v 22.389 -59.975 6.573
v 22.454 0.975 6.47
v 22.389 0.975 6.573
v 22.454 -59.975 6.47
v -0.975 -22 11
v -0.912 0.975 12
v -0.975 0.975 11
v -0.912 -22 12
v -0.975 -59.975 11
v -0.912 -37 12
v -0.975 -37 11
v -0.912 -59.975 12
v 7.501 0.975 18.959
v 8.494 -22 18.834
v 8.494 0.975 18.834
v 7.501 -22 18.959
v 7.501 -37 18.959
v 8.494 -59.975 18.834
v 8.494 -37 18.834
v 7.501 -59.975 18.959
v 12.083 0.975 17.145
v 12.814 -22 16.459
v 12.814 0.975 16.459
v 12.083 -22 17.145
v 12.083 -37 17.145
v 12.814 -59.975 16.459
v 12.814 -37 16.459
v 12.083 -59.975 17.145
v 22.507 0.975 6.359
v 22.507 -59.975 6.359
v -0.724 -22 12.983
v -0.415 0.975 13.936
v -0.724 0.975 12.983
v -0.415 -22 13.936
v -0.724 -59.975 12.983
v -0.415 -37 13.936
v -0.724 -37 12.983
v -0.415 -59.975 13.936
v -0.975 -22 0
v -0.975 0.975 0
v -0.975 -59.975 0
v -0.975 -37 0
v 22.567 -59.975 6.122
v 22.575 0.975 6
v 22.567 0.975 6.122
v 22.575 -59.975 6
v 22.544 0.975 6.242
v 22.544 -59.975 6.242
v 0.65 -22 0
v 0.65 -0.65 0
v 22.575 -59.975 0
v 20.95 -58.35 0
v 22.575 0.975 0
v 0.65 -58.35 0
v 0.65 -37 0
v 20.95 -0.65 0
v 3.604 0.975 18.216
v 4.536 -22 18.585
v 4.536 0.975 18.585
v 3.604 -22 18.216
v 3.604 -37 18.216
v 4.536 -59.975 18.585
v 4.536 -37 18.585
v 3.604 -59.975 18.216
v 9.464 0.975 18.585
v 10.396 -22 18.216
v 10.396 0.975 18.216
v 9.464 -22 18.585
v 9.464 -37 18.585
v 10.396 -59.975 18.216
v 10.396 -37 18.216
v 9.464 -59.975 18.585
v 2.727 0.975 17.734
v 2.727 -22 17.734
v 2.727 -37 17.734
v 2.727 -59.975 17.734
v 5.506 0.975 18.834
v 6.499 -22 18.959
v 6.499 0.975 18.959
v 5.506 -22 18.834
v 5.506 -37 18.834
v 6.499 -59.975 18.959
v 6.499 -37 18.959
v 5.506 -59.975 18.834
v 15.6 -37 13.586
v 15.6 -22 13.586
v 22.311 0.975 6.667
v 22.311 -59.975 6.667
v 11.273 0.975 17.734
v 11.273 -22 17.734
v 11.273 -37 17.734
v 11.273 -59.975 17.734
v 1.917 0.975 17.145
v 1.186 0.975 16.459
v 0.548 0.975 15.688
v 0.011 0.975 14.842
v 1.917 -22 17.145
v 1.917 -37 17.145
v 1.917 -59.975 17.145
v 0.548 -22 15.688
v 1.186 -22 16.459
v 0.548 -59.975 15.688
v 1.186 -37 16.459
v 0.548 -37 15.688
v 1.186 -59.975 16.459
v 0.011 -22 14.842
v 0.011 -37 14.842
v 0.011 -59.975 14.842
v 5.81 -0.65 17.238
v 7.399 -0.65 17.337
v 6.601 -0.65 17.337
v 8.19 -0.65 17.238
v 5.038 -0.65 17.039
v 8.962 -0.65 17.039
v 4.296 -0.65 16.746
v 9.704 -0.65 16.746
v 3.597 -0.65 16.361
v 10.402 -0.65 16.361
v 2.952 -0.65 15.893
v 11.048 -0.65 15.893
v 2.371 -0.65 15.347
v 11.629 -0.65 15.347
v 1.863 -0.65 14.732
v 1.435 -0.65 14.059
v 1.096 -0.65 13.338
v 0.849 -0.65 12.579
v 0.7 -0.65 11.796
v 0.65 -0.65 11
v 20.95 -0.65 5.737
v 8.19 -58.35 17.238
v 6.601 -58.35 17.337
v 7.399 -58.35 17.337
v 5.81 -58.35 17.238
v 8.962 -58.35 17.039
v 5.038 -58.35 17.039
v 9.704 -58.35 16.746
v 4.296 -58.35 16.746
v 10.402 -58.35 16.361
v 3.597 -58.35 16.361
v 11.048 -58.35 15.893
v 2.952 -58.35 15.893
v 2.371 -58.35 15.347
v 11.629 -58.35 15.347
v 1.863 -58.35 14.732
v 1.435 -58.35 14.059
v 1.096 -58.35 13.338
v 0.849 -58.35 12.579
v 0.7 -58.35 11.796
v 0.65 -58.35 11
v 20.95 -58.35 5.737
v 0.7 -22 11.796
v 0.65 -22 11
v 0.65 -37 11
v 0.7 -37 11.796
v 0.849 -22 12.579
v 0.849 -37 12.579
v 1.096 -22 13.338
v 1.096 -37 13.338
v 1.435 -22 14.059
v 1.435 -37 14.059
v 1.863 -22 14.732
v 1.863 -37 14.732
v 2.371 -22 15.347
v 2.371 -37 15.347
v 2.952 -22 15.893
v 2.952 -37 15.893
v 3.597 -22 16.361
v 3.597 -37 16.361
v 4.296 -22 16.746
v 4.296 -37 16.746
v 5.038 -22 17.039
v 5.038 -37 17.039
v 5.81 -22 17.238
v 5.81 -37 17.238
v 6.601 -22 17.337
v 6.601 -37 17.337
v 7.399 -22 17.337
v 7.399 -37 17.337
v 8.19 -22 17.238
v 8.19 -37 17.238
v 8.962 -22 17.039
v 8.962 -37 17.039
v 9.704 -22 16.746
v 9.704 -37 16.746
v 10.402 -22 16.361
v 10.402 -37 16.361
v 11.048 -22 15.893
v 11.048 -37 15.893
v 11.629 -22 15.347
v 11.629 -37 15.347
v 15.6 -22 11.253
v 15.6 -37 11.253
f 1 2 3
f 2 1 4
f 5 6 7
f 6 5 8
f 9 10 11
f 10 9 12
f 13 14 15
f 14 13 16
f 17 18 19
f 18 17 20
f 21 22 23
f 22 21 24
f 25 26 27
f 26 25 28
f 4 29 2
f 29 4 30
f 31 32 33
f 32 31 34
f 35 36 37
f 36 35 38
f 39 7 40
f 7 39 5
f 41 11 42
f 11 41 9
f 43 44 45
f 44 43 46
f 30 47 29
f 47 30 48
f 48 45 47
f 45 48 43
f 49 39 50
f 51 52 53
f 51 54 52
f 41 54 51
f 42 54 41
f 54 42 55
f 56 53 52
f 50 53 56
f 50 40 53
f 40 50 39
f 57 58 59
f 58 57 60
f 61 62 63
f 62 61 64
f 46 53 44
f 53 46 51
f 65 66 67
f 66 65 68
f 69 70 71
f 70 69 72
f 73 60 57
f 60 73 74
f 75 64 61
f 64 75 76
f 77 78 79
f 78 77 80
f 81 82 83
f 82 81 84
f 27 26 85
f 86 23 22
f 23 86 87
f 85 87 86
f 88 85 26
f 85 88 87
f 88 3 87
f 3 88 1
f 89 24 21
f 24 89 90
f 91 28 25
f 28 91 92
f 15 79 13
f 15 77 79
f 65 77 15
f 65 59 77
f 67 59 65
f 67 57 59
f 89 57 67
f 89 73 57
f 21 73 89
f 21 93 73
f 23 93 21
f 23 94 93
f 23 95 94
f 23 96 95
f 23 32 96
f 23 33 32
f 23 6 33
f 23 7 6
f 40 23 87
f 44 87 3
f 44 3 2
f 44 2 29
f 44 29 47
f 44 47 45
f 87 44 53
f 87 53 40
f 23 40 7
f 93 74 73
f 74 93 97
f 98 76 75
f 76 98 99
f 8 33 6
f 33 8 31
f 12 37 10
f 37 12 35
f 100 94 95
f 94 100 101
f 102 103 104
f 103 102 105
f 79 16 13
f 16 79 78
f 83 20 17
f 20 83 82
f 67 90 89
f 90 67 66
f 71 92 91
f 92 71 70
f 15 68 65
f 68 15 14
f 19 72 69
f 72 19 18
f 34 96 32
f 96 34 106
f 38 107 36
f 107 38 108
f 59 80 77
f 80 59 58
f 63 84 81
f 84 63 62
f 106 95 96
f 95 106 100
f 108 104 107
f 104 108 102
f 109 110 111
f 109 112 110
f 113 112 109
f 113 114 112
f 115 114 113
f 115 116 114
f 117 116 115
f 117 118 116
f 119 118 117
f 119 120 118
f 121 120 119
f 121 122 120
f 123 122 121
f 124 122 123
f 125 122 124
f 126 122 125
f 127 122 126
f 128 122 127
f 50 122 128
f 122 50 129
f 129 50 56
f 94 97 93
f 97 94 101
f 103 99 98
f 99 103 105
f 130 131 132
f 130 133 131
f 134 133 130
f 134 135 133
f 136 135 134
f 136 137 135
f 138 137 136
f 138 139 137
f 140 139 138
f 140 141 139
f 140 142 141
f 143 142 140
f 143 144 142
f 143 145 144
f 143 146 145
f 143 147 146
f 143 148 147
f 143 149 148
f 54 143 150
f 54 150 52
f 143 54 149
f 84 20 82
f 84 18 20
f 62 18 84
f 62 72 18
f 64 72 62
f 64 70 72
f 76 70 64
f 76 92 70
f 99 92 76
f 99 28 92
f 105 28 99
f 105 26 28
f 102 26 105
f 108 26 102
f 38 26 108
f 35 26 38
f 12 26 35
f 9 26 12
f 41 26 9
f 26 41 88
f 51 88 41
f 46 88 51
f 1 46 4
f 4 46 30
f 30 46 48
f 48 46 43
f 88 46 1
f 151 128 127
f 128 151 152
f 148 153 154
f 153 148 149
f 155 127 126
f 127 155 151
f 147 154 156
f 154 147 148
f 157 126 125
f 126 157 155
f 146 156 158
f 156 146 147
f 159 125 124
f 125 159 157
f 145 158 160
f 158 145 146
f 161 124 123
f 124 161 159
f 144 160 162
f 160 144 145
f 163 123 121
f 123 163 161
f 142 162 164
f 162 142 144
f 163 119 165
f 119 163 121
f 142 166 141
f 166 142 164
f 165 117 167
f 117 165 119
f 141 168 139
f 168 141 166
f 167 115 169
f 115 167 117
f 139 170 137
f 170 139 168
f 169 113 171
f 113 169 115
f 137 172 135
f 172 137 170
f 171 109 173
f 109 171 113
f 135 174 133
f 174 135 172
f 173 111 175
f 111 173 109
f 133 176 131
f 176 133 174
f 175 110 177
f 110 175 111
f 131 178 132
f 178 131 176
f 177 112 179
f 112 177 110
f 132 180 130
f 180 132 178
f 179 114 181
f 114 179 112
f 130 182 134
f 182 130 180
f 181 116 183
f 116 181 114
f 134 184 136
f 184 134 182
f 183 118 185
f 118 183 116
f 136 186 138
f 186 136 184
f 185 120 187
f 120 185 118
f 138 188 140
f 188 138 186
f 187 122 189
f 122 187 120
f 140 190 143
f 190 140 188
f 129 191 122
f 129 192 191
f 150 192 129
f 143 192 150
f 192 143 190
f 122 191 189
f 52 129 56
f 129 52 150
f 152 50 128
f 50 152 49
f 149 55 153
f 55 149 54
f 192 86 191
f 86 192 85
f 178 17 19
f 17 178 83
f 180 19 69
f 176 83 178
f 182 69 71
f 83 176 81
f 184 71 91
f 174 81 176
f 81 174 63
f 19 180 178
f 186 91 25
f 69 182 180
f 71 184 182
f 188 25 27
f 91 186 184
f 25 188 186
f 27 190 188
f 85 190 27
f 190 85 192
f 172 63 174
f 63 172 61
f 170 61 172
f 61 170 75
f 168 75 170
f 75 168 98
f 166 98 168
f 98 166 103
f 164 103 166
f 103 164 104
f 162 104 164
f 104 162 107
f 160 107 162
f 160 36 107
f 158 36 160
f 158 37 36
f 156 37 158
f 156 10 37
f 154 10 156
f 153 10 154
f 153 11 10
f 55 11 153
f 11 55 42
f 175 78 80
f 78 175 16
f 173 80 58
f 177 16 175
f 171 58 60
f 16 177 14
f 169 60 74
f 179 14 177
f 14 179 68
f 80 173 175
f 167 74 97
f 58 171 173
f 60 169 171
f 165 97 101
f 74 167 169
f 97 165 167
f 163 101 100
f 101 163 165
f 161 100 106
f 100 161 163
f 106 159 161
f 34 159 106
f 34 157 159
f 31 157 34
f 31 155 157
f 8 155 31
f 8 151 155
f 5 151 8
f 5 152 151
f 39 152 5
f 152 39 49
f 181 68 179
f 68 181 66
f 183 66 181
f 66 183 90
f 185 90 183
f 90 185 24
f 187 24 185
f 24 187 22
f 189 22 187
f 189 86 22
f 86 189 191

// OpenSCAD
eps = 0.01;
wall = 0.65;
length = 59;
width = 21.6;
cut_in_length = 15;
extra_walls = 1.5;


module element()
{
  module profile_shell_int()
  {
    module exterior()
    {
      module profile()
      {
        r=7;
        hull()
        {
          translate(r*[1,1,0] + [0,4,0])
            circle(r=r, $fn=50);
          square([width, 6]);
        }
      }
      intersection()
      {
        minkowski()
        {
          difference()
          {
            translate(-5*[1,1,0])
              square([30,30]);
            profile();
          }
          circle(r=wall, $fn=50);
        }
        profile();
      }
    }
    difference()
    {
      exterior();
      translate(wall*[1,0] - eps*[0,1])
        square([width-2*wall, wall+2*eps]);
    }
  }

  module profile_shell()
  {
    intersection()
    {
      // additional wall thickness
      union()
      {
        difference()
        {
          minkowski()
          {
            profile_shell_int();
            circle(r=wall*extra_walls, $fn=50);
          }
          #hull()
            profile_shell_int();
        }
        profile_shell_int();
      }
      // remove bottom overhang
      translate(-10*[1,0])
        square(100*[1,1]);
    }
  }

  module surround()
  {
    linear_extrude(length)
      profile_shell();
  }
  module side()
  {
    linear_extrude(wall*(1+extra_walls))
      hull()
        profile_shell();
  }

  module core()
  {
    surround();
    for(dz=[-extra_walls*wall, length-wall])
      translate([0,0,dz])
        side();
  }

  rotate([90, 0, 0])
    difference()
    {
      core();
      translate(length/2*[0,0,1] - [6,0,0])
        translate(-cut_in_length/2*[0,0,1])
          cube([width, 30, cut_in_length]);
    }
}


element();
